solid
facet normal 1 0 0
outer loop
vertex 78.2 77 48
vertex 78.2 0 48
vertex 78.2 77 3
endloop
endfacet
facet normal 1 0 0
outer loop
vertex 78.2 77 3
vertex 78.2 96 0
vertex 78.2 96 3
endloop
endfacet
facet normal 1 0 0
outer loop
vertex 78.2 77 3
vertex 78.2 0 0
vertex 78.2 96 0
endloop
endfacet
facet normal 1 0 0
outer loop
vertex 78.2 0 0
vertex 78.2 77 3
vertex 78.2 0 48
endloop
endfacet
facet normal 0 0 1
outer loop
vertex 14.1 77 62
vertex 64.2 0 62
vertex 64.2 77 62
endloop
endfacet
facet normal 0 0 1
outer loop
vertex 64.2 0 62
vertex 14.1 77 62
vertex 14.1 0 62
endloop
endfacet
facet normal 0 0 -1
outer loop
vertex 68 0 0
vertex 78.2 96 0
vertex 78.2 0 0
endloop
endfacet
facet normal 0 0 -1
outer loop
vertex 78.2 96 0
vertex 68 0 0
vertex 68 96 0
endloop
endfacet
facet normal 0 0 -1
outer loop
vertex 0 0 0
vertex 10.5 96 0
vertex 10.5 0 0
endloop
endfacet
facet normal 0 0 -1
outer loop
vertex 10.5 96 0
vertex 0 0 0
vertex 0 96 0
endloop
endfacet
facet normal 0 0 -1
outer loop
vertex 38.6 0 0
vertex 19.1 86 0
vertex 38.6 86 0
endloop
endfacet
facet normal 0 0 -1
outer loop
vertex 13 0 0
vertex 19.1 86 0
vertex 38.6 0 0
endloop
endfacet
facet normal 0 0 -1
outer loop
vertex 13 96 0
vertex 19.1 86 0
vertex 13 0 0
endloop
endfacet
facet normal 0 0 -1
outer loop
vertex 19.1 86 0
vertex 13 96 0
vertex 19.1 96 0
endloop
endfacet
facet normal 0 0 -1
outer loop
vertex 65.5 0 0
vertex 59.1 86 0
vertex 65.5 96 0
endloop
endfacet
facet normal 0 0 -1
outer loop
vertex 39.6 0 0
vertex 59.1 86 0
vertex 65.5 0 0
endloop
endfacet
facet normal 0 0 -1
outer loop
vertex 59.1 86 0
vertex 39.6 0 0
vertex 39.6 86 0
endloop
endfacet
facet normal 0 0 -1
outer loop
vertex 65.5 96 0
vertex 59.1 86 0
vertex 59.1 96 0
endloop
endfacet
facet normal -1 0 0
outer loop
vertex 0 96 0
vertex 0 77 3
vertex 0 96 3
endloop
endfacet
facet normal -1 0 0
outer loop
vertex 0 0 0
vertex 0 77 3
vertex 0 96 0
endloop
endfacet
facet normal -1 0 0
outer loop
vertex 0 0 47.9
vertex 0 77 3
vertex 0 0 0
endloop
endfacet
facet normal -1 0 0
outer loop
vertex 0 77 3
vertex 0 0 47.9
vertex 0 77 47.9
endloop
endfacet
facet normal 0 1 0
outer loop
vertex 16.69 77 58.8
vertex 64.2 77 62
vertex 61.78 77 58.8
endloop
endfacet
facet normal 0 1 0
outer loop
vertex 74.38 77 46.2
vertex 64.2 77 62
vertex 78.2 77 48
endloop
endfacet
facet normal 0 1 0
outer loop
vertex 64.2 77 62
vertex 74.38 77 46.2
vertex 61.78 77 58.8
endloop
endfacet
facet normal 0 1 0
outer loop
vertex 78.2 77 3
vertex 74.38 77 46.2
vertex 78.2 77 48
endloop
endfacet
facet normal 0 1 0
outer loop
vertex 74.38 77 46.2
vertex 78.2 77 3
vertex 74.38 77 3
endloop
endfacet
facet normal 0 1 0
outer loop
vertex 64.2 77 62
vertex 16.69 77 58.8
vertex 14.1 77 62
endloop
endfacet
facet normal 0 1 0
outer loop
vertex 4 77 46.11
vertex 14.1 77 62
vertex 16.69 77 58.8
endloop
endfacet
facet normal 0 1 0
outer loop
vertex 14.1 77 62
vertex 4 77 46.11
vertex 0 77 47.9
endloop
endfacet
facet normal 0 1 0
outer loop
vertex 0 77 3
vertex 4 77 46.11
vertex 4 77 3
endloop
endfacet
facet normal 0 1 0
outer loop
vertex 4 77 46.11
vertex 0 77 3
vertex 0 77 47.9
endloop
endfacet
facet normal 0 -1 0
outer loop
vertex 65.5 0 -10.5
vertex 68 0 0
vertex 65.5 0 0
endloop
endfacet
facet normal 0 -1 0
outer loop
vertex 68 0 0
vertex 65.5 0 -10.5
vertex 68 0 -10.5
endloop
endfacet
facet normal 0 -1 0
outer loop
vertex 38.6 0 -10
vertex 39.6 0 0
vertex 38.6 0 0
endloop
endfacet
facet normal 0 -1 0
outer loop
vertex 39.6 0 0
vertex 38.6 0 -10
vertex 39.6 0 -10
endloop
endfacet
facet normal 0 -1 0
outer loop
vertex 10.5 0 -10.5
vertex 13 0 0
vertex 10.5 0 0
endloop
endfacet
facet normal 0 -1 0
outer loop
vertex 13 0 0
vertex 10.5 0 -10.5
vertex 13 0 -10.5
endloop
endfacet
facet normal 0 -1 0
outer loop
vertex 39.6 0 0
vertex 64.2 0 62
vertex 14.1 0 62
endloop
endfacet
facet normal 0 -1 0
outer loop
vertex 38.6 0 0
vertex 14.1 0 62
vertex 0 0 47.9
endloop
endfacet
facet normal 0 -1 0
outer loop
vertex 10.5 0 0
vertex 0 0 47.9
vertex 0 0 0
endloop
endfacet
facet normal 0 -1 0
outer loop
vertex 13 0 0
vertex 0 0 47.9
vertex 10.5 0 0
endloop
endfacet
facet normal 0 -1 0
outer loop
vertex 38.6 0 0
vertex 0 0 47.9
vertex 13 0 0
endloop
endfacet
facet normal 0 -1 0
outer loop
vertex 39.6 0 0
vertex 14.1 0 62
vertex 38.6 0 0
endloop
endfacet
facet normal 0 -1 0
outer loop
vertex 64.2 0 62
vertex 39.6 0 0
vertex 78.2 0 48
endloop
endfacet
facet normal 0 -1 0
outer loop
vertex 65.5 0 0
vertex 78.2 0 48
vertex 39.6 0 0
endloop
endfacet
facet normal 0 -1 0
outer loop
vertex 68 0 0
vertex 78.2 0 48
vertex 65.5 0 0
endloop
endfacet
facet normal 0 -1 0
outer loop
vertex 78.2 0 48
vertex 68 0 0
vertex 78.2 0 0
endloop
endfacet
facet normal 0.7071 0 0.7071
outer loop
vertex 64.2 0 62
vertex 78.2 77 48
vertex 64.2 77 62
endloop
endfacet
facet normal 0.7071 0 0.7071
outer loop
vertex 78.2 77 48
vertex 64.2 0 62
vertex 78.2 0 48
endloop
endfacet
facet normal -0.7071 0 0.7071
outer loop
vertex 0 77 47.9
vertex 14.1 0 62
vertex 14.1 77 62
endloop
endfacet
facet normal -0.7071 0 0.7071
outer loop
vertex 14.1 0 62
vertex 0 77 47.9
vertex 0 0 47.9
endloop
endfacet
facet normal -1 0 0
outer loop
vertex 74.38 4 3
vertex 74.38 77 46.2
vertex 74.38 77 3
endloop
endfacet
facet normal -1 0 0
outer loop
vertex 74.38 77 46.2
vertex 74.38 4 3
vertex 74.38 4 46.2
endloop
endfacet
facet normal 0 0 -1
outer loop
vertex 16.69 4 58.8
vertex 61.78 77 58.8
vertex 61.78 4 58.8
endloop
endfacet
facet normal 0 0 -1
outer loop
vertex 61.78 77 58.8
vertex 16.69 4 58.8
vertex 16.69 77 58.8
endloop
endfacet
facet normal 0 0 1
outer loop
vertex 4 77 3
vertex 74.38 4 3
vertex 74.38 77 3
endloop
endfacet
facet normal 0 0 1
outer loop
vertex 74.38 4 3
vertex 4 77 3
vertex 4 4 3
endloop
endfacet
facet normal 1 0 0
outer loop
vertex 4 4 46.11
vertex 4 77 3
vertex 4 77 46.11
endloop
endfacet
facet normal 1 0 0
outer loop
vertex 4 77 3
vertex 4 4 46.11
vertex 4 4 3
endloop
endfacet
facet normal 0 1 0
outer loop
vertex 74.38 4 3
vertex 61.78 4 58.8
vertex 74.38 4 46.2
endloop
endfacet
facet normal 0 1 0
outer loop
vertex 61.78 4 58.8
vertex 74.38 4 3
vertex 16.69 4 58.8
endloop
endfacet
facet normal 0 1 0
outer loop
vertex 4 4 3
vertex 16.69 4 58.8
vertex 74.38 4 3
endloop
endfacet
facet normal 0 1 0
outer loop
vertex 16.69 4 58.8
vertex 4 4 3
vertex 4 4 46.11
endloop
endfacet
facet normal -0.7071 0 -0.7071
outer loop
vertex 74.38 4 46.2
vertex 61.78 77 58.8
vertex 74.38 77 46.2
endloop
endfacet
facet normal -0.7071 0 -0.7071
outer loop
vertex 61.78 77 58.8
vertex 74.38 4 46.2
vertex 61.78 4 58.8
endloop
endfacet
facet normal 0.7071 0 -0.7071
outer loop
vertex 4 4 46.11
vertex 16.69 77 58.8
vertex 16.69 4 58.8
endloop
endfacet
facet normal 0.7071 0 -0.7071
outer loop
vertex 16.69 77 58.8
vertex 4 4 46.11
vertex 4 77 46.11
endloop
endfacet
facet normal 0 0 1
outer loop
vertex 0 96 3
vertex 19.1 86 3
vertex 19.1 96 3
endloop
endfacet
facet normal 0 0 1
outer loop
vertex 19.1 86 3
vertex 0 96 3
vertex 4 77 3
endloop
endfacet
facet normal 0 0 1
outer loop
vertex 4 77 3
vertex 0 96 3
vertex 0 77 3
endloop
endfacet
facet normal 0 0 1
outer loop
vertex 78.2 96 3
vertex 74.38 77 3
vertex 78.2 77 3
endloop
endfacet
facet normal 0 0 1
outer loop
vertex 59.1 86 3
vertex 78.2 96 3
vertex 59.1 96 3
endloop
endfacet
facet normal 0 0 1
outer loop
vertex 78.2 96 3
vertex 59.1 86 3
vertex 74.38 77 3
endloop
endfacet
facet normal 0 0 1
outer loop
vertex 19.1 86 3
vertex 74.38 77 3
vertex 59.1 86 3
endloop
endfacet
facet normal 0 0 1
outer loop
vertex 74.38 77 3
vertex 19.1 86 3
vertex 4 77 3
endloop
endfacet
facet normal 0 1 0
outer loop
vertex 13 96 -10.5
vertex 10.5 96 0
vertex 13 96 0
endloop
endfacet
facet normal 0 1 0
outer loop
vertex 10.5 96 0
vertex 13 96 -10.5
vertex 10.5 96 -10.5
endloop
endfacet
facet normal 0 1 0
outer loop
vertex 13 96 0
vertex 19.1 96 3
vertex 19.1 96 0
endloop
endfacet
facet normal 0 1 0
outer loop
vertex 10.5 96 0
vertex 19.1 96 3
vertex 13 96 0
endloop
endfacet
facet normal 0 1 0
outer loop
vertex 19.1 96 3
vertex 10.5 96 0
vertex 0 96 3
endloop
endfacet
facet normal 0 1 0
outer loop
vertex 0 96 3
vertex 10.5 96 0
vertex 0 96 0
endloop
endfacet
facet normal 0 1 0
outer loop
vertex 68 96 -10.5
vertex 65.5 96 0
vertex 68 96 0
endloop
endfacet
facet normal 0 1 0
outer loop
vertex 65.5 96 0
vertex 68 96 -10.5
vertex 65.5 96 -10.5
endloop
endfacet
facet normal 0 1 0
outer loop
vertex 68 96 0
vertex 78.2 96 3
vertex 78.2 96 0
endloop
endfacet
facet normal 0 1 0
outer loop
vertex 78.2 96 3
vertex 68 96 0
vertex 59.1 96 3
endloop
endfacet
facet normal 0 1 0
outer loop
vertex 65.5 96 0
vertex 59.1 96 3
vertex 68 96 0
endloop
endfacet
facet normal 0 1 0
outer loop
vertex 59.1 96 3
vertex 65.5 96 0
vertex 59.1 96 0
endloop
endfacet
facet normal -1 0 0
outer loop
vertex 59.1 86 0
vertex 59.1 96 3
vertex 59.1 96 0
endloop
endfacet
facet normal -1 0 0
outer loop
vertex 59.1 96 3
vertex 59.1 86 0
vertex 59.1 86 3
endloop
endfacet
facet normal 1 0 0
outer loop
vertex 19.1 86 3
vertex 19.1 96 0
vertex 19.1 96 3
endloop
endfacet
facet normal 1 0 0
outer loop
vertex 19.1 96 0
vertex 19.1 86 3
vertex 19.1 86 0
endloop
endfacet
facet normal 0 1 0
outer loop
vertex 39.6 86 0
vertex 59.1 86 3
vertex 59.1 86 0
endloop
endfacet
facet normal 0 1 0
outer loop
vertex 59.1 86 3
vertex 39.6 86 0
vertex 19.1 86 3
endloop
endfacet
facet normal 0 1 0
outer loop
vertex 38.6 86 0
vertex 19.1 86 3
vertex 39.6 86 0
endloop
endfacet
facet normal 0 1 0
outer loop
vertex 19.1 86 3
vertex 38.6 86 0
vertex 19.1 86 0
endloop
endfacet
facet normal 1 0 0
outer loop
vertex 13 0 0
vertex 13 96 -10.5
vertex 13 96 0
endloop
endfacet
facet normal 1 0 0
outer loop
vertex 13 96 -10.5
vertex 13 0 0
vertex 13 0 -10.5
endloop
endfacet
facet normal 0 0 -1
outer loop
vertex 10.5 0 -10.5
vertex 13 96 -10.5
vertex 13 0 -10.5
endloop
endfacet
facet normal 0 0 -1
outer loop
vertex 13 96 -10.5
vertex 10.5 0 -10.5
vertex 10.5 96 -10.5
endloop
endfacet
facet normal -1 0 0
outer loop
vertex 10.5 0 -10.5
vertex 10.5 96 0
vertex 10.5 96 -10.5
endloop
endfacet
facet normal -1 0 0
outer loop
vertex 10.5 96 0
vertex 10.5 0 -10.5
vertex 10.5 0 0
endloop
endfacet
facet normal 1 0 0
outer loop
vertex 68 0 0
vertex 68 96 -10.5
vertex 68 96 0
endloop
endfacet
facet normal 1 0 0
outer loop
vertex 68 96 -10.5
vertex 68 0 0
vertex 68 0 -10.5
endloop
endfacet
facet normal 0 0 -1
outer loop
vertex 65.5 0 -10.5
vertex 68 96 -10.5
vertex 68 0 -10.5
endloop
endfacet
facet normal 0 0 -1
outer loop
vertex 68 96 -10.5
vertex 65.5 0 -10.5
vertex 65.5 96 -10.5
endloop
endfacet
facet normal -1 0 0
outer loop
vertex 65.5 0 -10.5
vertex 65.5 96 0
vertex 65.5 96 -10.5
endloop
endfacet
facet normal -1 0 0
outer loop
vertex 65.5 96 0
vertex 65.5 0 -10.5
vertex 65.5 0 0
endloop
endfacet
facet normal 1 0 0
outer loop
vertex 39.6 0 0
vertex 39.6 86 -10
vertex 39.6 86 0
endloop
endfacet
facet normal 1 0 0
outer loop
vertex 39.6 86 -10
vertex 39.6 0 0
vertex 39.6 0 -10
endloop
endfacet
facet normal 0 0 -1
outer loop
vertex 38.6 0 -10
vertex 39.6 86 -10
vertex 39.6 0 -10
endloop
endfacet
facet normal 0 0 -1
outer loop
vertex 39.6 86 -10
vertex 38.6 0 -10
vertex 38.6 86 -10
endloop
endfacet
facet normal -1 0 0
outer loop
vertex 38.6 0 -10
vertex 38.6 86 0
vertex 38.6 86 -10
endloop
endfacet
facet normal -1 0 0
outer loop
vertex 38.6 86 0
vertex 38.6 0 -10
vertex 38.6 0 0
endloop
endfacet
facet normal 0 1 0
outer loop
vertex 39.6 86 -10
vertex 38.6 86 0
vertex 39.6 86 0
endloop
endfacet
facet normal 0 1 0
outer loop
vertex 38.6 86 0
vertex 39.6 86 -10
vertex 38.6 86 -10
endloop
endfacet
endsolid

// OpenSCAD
hoehe=62.0;
breite=78.2;
laenge=77.0;

difference()
{
    
    garbageTruckBody();

    translate([4,4,3])
    {
        scale([0.9,1,0.9])
        {
            garbageTruckBody();
        }
    }
}

addOnsBottom();


module addOnsBottom()
{
    //color("red")
    translate([10.5,0,-10.5])
    cube([2.5,96.0,10.5]);

    //color("red")
    translate([65.5,0,-10.5])
    cube([2.5,96.0,10.5]);

    /* TODO */
    //color("red")
    translate([breite/2,43,-5])
    cube([1,86,10],center=true);

    difference()
    {
        //color("red")
        translate([0,laenge,0])
        cube([breite,19,3]);

        //color("red")
        translate([breite/2,92,0])
        cube([40,12,12],center=true);
    }
}

module garbageTruckBody()
{
    difference()
    {
        cube([breite,laenge, hoehe]);

        //color("red")
        translate([78.3,-10,47.9])
        {
            rotate([0,-45,0])
            {
                cube([20,100,20]);
            }
        }

        //color("red")
        translate([0,-10,47.9])
        {
            rotate([0,-45,0])
            {
                cube([20,100,20]);
            }
        }
       
    }
}
